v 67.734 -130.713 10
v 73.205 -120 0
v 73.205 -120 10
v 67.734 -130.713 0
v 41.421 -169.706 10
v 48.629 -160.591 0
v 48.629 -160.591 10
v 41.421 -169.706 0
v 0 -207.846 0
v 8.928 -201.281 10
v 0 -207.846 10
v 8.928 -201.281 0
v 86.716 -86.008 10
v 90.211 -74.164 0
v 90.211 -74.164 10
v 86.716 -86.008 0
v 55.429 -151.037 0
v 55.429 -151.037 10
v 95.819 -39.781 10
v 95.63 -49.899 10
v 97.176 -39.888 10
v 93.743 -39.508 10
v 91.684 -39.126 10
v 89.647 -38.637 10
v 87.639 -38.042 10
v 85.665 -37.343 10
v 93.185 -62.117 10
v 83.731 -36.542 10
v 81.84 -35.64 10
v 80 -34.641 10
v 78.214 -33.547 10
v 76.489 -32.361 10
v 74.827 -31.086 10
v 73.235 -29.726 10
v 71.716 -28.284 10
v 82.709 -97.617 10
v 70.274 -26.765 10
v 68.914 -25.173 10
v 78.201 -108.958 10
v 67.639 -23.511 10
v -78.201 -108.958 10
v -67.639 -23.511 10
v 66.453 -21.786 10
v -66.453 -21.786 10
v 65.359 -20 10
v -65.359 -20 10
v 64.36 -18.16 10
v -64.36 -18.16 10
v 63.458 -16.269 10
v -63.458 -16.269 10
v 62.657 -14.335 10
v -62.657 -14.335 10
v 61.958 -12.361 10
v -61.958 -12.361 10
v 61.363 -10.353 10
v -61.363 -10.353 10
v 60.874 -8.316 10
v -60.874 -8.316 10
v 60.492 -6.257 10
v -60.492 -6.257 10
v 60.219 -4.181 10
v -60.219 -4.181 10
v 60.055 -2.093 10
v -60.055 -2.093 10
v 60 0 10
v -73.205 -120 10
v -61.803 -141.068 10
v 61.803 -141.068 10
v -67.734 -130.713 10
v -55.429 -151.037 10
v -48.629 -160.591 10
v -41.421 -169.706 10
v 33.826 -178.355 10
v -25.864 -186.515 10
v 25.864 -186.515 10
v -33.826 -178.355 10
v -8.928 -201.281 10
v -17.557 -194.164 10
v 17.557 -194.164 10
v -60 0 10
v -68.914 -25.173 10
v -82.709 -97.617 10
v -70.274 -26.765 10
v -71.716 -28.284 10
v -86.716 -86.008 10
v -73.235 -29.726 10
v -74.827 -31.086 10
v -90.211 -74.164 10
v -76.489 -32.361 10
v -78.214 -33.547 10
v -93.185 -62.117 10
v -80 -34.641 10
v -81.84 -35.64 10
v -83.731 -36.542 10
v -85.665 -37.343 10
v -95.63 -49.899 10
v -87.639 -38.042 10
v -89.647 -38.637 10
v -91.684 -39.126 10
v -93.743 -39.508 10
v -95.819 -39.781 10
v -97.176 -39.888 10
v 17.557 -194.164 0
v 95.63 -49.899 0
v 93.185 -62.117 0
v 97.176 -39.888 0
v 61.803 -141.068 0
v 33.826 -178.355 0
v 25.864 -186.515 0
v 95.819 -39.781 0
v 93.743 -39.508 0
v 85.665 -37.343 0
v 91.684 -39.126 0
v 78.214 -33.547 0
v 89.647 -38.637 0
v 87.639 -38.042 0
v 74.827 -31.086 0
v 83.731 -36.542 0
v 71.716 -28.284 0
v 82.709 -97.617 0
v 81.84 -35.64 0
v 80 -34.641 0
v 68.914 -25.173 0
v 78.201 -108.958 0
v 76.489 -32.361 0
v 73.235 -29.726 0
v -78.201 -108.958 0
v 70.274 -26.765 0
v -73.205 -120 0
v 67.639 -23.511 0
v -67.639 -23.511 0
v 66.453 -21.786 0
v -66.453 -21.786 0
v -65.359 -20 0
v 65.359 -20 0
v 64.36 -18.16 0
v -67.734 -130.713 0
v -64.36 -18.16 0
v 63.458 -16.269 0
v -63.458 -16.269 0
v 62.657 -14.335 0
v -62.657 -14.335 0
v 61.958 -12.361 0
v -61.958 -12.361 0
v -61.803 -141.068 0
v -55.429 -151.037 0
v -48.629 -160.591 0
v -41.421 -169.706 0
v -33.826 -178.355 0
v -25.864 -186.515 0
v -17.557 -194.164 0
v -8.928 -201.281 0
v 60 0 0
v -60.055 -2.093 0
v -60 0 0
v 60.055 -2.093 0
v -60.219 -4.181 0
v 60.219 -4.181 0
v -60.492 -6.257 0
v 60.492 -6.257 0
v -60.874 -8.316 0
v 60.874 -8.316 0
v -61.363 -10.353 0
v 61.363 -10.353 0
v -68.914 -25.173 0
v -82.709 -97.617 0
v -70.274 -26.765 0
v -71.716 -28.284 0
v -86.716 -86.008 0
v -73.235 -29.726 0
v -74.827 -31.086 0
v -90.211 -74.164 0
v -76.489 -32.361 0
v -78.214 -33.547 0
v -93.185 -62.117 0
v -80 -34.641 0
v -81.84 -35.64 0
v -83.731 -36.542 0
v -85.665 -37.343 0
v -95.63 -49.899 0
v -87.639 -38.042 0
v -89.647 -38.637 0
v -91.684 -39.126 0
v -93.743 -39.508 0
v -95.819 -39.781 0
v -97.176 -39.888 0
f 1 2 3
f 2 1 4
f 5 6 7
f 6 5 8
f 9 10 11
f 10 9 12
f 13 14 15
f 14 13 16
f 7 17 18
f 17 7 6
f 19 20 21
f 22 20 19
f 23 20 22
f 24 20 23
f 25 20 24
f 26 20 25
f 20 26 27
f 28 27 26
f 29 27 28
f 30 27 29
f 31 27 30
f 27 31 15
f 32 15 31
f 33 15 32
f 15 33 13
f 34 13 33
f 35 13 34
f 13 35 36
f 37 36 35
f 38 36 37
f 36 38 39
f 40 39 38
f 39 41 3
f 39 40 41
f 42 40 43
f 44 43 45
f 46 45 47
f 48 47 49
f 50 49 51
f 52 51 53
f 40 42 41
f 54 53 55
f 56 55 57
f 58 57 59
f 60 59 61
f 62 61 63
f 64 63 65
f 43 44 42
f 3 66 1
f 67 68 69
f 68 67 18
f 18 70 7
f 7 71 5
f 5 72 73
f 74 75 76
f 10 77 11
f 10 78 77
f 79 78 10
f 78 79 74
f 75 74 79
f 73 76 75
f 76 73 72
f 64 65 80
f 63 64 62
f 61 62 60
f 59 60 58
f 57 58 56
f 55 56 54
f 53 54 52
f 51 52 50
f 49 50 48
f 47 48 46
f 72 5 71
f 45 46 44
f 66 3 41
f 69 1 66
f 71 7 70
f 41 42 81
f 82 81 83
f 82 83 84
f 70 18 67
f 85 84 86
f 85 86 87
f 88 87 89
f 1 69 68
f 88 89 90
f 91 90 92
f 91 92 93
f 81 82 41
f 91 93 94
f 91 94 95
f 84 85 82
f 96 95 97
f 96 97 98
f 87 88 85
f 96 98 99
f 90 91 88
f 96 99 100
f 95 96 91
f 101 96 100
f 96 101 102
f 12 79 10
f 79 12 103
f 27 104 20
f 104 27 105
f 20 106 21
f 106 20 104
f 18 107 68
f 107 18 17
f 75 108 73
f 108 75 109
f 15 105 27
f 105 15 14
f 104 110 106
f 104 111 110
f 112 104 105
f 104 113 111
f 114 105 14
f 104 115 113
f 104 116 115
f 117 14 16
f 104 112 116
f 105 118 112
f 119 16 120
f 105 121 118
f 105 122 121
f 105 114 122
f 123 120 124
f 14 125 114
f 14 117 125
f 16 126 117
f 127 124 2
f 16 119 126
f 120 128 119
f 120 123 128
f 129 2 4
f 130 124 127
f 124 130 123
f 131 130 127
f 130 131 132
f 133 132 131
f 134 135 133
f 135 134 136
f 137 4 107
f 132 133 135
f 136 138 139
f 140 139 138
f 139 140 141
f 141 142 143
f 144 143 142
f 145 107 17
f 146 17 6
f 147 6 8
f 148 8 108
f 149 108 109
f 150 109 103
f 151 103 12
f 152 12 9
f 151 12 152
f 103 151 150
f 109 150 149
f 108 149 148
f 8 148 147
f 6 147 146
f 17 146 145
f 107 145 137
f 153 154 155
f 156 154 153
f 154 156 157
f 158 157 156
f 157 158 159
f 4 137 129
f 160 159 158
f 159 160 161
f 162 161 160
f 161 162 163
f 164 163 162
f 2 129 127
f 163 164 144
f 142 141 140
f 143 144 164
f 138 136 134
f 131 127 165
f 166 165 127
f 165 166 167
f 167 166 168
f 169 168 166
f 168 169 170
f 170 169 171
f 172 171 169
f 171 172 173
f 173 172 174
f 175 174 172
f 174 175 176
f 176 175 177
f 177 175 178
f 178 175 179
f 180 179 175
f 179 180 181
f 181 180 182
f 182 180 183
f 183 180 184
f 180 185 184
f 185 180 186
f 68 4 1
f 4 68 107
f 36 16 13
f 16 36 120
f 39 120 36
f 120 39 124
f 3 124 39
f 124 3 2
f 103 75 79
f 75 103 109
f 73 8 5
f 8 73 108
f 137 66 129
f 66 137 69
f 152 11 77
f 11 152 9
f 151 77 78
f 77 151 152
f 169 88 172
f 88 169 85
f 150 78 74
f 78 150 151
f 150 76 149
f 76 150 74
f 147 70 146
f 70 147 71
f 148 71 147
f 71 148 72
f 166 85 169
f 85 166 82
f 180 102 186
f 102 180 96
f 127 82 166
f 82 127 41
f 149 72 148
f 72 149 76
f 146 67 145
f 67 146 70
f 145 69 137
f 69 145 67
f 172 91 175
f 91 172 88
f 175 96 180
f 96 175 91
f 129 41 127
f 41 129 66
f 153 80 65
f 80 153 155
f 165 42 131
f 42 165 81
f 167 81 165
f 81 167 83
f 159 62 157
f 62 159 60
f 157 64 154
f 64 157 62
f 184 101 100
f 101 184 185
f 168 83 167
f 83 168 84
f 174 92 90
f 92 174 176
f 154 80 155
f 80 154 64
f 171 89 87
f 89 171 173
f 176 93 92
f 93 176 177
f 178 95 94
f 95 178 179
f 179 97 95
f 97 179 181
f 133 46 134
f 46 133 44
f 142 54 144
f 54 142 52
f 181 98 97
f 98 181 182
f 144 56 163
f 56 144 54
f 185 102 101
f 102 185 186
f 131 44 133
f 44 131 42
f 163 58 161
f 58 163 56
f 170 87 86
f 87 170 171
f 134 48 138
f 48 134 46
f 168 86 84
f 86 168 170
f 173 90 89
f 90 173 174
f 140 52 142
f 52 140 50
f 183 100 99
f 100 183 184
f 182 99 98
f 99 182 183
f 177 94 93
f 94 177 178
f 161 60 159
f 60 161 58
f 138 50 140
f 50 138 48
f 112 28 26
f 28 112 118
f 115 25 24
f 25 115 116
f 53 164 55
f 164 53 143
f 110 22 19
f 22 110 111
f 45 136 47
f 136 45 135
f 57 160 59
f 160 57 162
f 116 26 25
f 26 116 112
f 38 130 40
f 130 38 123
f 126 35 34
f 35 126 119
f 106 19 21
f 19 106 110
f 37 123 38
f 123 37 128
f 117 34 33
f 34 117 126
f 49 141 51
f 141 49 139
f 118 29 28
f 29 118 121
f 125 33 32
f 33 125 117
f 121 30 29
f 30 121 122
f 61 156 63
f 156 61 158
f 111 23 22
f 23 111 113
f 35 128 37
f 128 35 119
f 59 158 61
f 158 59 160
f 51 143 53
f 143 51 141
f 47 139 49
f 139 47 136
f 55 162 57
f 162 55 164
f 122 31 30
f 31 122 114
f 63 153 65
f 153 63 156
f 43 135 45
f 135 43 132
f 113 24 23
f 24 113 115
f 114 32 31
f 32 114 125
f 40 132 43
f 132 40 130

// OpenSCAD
$fs=1;
$fa=3;

THICKNESS = 10;
WIDTH = 200;
HEIGHT = 240;
CUTOUT = 40;

difference() {
  scale([1, HEIGHT / WIDTH, 1])
    intersection() {
      translate([-WIDTH / 2, 0, 0])
        cylinder(r=WIDTH, h=THICKNESS);
      translate([WIDTH / 2, 0, 0])
        cylinder(r=WIDTH, h=THICKNESS);
      translate([0, -WIDTH, 0])
        cube([WIDTH * 2, WIDTH * 2, THICKNESS * 2], center=true);
    }
  translate([-WIDTH / 2, 0, THICKNESS / 2])
    cylinder(r=CUTOUT, h=THICKNESS * 2, center=true);
  translate([WIDTH / 2, 0, THICKNESS / 2])
    cylinder(r=CUTOUT, h=THICKNESS * 2, center=true);
}
